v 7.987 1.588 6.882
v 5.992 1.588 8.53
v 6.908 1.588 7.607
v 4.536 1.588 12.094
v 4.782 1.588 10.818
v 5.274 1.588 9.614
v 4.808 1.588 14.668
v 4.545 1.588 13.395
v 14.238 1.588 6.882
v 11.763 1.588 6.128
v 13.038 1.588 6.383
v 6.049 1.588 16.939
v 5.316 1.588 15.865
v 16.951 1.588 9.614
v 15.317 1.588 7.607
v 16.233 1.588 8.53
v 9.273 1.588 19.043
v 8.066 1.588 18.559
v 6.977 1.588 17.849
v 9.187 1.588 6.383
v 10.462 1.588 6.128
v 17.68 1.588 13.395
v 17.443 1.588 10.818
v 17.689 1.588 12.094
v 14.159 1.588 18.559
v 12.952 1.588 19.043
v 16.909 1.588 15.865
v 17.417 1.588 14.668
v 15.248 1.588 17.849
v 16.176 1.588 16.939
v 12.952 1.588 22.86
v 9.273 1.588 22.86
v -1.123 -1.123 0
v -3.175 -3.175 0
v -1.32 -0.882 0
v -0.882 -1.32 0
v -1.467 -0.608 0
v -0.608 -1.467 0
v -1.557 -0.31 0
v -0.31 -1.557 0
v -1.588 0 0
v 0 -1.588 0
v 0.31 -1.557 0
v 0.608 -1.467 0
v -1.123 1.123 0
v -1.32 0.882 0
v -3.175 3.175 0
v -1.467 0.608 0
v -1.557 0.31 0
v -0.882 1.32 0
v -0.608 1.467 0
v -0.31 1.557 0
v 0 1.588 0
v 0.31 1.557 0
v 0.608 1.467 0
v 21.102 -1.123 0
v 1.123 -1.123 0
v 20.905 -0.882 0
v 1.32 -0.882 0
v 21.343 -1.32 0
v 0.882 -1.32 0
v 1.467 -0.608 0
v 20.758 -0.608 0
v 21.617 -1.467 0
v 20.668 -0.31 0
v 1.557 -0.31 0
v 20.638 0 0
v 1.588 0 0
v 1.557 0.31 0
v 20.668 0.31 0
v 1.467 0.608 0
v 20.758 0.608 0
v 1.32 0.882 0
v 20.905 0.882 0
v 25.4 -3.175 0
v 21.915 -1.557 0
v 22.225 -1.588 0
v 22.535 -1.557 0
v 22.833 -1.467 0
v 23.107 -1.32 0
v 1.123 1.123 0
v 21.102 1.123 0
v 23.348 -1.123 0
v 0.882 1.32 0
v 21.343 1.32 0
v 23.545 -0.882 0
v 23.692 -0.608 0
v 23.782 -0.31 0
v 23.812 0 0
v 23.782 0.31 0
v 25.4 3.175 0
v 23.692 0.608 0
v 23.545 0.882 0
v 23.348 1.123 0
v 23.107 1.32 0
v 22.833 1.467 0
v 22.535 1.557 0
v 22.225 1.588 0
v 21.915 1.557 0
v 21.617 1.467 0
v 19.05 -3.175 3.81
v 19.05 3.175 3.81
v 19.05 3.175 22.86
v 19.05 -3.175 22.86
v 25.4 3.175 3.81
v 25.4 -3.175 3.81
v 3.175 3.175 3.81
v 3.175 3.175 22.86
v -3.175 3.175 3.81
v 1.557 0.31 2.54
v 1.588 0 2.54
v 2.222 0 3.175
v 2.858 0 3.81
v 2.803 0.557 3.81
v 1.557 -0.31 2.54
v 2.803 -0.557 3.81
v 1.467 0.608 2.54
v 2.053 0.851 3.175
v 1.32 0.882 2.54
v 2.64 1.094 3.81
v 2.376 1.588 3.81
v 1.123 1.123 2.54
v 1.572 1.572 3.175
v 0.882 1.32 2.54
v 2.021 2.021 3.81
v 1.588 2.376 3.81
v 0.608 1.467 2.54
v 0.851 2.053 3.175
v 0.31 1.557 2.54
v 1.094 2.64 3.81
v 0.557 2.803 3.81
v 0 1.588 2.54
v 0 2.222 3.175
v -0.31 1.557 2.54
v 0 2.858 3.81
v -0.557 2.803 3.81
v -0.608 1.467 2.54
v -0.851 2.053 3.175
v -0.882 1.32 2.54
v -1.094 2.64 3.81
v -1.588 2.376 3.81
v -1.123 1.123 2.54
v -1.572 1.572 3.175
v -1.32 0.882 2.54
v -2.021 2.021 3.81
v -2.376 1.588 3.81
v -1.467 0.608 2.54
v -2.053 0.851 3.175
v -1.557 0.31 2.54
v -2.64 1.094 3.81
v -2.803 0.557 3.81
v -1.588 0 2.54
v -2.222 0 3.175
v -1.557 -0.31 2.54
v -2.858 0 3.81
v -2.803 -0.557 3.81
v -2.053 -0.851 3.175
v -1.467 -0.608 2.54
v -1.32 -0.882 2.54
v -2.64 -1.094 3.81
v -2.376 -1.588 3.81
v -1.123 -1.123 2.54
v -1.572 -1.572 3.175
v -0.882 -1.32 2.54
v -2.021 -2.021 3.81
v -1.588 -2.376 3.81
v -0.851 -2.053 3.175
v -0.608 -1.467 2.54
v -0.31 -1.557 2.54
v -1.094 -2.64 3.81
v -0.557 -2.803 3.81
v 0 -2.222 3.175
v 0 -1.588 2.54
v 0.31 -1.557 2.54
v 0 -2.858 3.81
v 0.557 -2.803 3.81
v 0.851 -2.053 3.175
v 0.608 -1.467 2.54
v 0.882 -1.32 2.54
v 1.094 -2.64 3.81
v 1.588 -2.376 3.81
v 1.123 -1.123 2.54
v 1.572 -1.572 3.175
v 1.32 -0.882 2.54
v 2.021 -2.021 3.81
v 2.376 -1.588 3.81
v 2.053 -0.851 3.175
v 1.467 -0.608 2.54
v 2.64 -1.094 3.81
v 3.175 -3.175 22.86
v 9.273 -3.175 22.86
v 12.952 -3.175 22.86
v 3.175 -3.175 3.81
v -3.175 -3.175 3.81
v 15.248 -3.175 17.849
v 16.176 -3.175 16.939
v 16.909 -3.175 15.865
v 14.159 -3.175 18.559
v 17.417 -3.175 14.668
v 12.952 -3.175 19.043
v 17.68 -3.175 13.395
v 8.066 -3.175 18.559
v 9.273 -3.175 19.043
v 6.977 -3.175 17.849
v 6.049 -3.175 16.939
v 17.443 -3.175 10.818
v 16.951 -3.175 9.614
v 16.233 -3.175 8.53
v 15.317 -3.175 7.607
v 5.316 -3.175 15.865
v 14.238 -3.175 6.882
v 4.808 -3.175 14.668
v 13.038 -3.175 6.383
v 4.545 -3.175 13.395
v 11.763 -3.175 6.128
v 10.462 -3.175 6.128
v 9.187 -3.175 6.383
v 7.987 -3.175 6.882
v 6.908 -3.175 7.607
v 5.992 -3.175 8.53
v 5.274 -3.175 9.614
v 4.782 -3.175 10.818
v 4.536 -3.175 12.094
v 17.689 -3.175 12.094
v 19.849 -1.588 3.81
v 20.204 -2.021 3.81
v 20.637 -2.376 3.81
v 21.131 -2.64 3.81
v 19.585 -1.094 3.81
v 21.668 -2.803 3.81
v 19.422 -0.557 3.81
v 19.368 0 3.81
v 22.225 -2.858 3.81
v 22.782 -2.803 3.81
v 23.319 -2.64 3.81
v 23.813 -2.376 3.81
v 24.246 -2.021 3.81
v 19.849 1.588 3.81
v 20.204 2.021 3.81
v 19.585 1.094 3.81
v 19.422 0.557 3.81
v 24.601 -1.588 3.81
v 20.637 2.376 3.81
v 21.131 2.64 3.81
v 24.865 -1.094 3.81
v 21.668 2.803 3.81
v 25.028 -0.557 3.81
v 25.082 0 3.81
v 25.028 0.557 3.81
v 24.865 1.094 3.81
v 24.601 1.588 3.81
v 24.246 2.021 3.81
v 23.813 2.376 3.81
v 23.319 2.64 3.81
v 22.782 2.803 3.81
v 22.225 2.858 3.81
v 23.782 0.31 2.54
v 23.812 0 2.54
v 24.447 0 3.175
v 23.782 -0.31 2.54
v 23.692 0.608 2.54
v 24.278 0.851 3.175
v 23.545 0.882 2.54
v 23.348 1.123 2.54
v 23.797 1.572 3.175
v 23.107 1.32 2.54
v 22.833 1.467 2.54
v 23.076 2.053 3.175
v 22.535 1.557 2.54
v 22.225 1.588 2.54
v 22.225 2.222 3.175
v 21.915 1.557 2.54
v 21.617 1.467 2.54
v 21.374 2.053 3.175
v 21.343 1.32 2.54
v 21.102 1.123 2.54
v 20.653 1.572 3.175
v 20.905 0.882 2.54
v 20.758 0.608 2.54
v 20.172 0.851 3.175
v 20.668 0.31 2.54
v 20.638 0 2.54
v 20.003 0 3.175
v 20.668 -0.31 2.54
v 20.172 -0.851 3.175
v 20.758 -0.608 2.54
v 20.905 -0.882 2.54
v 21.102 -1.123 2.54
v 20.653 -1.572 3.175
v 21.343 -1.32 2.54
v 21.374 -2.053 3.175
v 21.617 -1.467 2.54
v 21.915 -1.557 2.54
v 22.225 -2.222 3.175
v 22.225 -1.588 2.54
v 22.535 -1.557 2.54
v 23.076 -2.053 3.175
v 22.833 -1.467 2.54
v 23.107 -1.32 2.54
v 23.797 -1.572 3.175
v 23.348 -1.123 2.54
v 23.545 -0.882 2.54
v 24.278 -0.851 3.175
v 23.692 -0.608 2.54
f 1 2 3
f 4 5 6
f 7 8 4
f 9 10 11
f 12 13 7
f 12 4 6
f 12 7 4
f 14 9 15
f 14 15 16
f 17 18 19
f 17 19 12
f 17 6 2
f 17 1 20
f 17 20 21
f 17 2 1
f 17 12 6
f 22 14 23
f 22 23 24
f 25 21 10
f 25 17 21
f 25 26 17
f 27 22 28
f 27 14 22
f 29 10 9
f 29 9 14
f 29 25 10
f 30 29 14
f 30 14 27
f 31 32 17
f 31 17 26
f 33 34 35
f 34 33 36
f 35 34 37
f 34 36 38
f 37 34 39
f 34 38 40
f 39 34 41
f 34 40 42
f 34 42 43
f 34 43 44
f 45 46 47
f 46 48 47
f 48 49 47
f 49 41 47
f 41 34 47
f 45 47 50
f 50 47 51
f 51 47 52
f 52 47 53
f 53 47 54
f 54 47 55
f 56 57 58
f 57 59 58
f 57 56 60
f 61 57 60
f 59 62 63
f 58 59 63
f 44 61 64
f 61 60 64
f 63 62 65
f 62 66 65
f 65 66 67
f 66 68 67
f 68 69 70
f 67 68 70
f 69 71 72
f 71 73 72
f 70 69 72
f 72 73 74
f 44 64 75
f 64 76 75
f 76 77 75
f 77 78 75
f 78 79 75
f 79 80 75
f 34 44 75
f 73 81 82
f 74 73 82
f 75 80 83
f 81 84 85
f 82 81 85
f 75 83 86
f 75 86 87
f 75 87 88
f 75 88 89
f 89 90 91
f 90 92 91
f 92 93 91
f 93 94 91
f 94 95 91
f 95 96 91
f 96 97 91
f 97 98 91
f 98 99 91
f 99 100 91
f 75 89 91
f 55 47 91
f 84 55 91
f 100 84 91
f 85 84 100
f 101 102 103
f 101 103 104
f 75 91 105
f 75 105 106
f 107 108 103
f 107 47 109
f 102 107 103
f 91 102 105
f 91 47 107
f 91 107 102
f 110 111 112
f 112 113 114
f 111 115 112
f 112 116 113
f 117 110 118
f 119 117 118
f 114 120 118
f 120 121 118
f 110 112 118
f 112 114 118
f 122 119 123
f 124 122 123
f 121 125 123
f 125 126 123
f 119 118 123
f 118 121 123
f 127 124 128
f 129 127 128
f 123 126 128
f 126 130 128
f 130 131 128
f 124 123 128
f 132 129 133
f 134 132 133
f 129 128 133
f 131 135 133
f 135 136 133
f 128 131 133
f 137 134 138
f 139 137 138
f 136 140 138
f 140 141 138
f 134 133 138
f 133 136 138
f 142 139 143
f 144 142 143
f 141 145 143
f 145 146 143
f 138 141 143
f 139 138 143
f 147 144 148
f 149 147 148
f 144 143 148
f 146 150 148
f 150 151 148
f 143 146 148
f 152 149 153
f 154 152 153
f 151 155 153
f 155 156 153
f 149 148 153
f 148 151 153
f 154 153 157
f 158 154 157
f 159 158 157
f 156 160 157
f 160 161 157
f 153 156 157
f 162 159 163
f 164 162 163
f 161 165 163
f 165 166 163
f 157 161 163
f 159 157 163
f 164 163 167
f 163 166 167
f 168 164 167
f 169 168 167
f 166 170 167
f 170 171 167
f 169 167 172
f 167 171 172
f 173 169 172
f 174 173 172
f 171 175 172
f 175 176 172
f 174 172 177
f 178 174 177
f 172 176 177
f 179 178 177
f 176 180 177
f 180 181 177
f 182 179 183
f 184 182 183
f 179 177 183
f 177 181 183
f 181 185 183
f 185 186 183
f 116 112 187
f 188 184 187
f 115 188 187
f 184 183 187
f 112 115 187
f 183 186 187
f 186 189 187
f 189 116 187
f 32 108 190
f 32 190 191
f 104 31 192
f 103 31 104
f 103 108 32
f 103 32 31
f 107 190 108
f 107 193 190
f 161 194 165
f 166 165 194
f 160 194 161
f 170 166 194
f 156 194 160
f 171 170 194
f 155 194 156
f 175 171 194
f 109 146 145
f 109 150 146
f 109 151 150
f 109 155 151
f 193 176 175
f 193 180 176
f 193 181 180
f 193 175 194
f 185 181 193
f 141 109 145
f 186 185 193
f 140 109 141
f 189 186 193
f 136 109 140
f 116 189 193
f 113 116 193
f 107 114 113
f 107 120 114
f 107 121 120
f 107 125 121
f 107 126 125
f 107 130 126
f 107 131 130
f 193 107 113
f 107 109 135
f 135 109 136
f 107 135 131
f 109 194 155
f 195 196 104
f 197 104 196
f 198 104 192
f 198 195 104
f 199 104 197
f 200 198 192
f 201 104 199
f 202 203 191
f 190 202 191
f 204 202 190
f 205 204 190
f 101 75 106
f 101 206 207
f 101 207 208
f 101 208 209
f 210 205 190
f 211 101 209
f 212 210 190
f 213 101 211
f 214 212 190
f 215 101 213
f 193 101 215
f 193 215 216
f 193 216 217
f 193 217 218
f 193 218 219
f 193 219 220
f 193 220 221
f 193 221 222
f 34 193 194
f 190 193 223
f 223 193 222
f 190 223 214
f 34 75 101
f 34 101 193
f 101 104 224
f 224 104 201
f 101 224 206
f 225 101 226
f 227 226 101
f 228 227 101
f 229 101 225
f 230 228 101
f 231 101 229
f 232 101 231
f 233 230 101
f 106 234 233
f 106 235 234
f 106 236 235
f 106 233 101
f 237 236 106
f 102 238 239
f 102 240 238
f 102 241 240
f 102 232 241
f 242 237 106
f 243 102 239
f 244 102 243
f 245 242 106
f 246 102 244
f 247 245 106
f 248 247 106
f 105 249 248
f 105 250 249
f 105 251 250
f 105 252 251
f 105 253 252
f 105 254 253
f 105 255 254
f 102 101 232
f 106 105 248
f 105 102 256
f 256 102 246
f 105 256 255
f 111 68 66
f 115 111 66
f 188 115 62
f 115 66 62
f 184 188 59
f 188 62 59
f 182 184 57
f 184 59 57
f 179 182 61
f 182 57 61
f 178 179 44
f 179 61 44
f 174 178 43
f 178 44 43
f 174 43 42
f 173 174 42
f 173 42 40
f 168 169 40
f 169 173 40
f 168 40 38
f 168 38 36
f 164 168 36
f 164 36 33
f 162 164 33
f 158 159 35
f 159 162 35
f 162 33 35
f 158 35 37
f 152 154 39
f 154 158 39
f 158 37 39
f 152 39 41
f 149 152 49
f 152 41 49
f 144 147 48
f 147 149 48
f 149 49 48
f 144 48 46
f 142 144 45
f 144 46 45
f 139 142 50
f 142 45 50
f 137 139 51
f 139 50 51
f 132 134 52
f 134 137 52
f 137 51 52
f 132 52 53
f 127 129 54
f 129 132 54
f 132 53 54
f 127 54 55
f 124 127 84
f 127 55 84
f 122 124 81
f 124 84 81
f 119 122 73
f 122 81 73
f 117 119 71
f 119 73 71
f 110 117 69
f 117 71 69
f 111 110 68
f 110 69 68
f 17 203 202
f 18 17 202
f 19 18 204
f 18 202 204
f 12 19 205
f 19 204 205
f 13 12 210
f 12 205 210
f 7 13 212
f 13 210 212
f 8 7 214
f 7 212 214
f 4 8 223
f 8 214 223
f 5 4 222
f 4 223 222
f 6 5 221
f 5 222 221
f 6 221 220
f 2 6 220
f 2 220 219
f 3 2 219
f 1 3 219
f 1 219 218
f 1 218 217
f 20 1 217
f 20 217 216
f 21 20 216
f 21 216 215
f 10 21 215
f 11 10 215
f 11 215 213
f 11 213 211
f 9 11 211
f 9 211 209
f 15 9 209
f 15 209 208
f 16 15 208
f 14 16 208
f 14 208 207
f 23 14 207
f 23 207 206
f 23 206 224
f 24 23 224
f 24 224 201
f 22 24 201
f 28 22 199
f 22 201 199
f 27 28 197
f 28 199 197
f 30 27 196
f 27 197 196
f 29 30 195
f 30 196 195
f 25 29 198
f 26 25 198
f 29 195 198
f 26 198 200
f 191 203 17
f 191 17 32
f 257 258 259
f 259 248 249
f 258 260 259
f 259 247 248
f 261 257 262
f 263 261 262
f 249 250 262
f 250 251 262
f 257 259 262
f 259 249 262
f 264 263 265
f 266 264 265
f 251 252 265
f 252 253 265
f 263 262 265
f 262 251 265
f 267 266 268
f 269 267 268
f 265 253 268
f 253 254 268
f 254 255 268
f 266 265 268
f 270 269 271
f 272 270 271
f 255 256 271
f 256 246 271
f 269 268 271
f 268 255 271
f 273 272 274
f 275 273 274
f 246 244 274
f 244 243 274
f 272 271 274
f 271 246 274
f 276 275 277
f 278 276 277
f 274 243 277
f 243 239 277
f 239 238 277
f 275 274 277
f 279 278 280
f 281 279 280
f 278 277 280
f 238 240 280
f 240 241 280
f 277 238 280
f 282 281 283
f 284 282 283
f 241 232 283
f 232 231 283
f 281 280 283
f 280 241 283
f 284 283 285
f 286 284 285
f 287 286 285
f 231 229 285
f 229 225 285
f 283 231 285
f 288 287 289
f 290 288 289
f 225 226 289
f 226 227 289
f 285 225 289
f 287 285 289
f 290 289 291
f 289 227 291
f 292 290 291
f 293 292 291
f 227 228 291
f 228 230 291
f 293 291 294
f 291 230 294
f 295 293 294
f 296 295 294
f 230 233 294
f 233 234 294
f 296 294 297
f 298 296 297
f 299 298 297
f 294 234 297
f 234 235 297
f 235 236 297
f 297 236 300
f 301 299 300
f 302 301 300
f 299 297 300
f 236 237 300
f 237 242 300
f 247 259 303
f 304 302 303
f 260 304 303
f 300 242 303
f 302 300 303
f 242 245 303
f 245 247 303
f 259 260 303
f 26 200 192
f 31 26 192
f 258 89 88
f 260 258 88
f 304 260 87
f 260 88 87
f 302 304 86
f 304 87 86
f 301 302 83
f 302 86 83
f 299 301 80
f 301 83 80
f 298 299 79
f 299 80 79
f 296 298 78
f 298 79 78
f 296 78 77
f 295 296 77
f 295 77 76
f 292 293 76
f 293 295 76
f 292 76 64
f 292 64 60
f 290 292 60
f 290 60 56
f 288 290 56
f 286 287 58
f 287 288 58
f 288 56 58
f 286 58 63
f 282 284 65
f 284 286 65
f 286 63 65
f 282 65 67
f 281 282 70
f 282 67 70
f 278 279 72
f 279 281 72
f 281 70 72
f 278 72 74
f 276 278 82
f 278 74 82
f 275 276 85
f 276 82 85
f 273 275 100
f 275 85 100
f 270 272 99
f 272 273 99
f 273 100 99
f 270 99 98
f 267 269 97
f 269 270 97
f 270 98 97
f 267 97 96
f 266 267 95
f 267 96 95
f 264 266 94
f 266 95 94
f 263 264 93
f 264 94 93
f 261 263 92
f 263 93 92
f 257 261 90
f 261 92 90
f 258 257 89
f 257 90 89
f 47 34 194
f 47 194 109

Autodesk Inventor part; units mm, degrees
ref_plane "YZ Plane" through (0, 0, 0) normal (1, 0, 0) x (0, 1, 0)
ref_plane "XZ Plane" through (0, 0, 0) normal (0, 1, 0) x (-1, 0, 0)
ref_plane "XY Plane" through (0, 0, 0) normal (0, 0, 1) x (1, 0, 0)
sketch "Sketch1" plane through (0, 0, 0) normal (0, 0, 1) x (1, 0, 0)
  circle A0 centre (0, 0) radius 1.5875
  circle A1 centre (22.225, 0) radius 1.5875
  line L0 (-3.175, 3.175) -> (25.4, 3.175)
  line L1 (25.4, 3.175) -> (25.4, -3.175)
  line L2 (25.4, -3.175) -> (-3.175, -3.175)
  line L3 (-3.175, -3.175) -> (-3.175, 3.175)
  dimension "d0" = 3.175
  dimension "d1" = 3.175
  dimension "d2" = 22.225
  dimension "d3" = 3.175
  dimension "d4" = 3.175
  dimension "d5" = 3.175
  dimension "d6" = 3.175
extrude "Extrusion1" add sketch "Sketch1" along normal blind 3.81
sketch "Sketch2" plane through (0, 0, 3.81) normal (0, 0, 1) x (1, 0, 0)
  circle A0 centre (22.225, 0) radius 1.5875 projected
  circle A1 centre (0, 0) radius 1.5875 projected
  line L0 (25.4, 3.175) -> (-3.175, 3.175) projected
  line L1 (-3.175, 3.175) -> (-3.175, -3.175) projected
  line L2 (-3.175, -3.175) -> (25.4, -3.175) projected
  line L3 (25.4, -3.175) -> (25.4, 3.175) projected
  line L4 (3.175, 3.175) -> (19.05, 3.175)
  line L5 (19.05, 3.175) -> (19.05, -3.175)
  line L6 (19.05, -3.175) -> (3.175, -3.175)
  line L7 (3.175, -3.175) -> (3.175, 3.175)
  dimension "d9" = 15.875
  dimension "d10" = 3.175
extrude "Extrusion2" add sketch "Sketch2" along normal blind 19.05 contours L5 L2 L7 L0
sketch "Sketch3" plane through (-3.175, -3.175, 0) normal (0, -1, 0) x (1, 0, 0)
  line L0 (28.575, 0) -> (0, 0) projected
  line L1 (28.575, 0) -> (28.575, 3.81) projected
  line L2 (22.225, 3.81) -> (28.575, 3.81) projected
  line L3 (22.225, 3.81) -> (22.225, 22.86) projected
  line L4 (6.35, 22.86) -> (22.225, 22.86) projected
  line L5 (6.35, 3.81) -> (6.35, 22.86) projected
  line L6 (0, 3.81) -> (6.35, 3.81) projected
  line L7 (0, 0) -> (0, 3.81) projected
  line L8 (6.35, 3.81) -> (22.225, 3.81)
  circle A0 centre (14.2875, 12.7) radius 6.604
  line L9 (12.4481, 19.0427) -> (12.4481, 22.86)
  line L10 (16.1269, 19.0427) -> (16.1269, 22.86)
  point P0 (3.175, 0)
  dimension "d13" = 13.208
  dimension "d22" = 12.7
extrude "Extrusion4" cut sketch "Sketch3" against normal blind 4.7625 contours L10 A0 L9 L4 | A0
chamfer "Chamfer1" distance 1.27 angle 45 2 edges at (-1.5875, 0, 3.81) (20.6375, 0, 3.81)
properties part number "potentiometerMountForePlanes" material "ABS Plastic"
